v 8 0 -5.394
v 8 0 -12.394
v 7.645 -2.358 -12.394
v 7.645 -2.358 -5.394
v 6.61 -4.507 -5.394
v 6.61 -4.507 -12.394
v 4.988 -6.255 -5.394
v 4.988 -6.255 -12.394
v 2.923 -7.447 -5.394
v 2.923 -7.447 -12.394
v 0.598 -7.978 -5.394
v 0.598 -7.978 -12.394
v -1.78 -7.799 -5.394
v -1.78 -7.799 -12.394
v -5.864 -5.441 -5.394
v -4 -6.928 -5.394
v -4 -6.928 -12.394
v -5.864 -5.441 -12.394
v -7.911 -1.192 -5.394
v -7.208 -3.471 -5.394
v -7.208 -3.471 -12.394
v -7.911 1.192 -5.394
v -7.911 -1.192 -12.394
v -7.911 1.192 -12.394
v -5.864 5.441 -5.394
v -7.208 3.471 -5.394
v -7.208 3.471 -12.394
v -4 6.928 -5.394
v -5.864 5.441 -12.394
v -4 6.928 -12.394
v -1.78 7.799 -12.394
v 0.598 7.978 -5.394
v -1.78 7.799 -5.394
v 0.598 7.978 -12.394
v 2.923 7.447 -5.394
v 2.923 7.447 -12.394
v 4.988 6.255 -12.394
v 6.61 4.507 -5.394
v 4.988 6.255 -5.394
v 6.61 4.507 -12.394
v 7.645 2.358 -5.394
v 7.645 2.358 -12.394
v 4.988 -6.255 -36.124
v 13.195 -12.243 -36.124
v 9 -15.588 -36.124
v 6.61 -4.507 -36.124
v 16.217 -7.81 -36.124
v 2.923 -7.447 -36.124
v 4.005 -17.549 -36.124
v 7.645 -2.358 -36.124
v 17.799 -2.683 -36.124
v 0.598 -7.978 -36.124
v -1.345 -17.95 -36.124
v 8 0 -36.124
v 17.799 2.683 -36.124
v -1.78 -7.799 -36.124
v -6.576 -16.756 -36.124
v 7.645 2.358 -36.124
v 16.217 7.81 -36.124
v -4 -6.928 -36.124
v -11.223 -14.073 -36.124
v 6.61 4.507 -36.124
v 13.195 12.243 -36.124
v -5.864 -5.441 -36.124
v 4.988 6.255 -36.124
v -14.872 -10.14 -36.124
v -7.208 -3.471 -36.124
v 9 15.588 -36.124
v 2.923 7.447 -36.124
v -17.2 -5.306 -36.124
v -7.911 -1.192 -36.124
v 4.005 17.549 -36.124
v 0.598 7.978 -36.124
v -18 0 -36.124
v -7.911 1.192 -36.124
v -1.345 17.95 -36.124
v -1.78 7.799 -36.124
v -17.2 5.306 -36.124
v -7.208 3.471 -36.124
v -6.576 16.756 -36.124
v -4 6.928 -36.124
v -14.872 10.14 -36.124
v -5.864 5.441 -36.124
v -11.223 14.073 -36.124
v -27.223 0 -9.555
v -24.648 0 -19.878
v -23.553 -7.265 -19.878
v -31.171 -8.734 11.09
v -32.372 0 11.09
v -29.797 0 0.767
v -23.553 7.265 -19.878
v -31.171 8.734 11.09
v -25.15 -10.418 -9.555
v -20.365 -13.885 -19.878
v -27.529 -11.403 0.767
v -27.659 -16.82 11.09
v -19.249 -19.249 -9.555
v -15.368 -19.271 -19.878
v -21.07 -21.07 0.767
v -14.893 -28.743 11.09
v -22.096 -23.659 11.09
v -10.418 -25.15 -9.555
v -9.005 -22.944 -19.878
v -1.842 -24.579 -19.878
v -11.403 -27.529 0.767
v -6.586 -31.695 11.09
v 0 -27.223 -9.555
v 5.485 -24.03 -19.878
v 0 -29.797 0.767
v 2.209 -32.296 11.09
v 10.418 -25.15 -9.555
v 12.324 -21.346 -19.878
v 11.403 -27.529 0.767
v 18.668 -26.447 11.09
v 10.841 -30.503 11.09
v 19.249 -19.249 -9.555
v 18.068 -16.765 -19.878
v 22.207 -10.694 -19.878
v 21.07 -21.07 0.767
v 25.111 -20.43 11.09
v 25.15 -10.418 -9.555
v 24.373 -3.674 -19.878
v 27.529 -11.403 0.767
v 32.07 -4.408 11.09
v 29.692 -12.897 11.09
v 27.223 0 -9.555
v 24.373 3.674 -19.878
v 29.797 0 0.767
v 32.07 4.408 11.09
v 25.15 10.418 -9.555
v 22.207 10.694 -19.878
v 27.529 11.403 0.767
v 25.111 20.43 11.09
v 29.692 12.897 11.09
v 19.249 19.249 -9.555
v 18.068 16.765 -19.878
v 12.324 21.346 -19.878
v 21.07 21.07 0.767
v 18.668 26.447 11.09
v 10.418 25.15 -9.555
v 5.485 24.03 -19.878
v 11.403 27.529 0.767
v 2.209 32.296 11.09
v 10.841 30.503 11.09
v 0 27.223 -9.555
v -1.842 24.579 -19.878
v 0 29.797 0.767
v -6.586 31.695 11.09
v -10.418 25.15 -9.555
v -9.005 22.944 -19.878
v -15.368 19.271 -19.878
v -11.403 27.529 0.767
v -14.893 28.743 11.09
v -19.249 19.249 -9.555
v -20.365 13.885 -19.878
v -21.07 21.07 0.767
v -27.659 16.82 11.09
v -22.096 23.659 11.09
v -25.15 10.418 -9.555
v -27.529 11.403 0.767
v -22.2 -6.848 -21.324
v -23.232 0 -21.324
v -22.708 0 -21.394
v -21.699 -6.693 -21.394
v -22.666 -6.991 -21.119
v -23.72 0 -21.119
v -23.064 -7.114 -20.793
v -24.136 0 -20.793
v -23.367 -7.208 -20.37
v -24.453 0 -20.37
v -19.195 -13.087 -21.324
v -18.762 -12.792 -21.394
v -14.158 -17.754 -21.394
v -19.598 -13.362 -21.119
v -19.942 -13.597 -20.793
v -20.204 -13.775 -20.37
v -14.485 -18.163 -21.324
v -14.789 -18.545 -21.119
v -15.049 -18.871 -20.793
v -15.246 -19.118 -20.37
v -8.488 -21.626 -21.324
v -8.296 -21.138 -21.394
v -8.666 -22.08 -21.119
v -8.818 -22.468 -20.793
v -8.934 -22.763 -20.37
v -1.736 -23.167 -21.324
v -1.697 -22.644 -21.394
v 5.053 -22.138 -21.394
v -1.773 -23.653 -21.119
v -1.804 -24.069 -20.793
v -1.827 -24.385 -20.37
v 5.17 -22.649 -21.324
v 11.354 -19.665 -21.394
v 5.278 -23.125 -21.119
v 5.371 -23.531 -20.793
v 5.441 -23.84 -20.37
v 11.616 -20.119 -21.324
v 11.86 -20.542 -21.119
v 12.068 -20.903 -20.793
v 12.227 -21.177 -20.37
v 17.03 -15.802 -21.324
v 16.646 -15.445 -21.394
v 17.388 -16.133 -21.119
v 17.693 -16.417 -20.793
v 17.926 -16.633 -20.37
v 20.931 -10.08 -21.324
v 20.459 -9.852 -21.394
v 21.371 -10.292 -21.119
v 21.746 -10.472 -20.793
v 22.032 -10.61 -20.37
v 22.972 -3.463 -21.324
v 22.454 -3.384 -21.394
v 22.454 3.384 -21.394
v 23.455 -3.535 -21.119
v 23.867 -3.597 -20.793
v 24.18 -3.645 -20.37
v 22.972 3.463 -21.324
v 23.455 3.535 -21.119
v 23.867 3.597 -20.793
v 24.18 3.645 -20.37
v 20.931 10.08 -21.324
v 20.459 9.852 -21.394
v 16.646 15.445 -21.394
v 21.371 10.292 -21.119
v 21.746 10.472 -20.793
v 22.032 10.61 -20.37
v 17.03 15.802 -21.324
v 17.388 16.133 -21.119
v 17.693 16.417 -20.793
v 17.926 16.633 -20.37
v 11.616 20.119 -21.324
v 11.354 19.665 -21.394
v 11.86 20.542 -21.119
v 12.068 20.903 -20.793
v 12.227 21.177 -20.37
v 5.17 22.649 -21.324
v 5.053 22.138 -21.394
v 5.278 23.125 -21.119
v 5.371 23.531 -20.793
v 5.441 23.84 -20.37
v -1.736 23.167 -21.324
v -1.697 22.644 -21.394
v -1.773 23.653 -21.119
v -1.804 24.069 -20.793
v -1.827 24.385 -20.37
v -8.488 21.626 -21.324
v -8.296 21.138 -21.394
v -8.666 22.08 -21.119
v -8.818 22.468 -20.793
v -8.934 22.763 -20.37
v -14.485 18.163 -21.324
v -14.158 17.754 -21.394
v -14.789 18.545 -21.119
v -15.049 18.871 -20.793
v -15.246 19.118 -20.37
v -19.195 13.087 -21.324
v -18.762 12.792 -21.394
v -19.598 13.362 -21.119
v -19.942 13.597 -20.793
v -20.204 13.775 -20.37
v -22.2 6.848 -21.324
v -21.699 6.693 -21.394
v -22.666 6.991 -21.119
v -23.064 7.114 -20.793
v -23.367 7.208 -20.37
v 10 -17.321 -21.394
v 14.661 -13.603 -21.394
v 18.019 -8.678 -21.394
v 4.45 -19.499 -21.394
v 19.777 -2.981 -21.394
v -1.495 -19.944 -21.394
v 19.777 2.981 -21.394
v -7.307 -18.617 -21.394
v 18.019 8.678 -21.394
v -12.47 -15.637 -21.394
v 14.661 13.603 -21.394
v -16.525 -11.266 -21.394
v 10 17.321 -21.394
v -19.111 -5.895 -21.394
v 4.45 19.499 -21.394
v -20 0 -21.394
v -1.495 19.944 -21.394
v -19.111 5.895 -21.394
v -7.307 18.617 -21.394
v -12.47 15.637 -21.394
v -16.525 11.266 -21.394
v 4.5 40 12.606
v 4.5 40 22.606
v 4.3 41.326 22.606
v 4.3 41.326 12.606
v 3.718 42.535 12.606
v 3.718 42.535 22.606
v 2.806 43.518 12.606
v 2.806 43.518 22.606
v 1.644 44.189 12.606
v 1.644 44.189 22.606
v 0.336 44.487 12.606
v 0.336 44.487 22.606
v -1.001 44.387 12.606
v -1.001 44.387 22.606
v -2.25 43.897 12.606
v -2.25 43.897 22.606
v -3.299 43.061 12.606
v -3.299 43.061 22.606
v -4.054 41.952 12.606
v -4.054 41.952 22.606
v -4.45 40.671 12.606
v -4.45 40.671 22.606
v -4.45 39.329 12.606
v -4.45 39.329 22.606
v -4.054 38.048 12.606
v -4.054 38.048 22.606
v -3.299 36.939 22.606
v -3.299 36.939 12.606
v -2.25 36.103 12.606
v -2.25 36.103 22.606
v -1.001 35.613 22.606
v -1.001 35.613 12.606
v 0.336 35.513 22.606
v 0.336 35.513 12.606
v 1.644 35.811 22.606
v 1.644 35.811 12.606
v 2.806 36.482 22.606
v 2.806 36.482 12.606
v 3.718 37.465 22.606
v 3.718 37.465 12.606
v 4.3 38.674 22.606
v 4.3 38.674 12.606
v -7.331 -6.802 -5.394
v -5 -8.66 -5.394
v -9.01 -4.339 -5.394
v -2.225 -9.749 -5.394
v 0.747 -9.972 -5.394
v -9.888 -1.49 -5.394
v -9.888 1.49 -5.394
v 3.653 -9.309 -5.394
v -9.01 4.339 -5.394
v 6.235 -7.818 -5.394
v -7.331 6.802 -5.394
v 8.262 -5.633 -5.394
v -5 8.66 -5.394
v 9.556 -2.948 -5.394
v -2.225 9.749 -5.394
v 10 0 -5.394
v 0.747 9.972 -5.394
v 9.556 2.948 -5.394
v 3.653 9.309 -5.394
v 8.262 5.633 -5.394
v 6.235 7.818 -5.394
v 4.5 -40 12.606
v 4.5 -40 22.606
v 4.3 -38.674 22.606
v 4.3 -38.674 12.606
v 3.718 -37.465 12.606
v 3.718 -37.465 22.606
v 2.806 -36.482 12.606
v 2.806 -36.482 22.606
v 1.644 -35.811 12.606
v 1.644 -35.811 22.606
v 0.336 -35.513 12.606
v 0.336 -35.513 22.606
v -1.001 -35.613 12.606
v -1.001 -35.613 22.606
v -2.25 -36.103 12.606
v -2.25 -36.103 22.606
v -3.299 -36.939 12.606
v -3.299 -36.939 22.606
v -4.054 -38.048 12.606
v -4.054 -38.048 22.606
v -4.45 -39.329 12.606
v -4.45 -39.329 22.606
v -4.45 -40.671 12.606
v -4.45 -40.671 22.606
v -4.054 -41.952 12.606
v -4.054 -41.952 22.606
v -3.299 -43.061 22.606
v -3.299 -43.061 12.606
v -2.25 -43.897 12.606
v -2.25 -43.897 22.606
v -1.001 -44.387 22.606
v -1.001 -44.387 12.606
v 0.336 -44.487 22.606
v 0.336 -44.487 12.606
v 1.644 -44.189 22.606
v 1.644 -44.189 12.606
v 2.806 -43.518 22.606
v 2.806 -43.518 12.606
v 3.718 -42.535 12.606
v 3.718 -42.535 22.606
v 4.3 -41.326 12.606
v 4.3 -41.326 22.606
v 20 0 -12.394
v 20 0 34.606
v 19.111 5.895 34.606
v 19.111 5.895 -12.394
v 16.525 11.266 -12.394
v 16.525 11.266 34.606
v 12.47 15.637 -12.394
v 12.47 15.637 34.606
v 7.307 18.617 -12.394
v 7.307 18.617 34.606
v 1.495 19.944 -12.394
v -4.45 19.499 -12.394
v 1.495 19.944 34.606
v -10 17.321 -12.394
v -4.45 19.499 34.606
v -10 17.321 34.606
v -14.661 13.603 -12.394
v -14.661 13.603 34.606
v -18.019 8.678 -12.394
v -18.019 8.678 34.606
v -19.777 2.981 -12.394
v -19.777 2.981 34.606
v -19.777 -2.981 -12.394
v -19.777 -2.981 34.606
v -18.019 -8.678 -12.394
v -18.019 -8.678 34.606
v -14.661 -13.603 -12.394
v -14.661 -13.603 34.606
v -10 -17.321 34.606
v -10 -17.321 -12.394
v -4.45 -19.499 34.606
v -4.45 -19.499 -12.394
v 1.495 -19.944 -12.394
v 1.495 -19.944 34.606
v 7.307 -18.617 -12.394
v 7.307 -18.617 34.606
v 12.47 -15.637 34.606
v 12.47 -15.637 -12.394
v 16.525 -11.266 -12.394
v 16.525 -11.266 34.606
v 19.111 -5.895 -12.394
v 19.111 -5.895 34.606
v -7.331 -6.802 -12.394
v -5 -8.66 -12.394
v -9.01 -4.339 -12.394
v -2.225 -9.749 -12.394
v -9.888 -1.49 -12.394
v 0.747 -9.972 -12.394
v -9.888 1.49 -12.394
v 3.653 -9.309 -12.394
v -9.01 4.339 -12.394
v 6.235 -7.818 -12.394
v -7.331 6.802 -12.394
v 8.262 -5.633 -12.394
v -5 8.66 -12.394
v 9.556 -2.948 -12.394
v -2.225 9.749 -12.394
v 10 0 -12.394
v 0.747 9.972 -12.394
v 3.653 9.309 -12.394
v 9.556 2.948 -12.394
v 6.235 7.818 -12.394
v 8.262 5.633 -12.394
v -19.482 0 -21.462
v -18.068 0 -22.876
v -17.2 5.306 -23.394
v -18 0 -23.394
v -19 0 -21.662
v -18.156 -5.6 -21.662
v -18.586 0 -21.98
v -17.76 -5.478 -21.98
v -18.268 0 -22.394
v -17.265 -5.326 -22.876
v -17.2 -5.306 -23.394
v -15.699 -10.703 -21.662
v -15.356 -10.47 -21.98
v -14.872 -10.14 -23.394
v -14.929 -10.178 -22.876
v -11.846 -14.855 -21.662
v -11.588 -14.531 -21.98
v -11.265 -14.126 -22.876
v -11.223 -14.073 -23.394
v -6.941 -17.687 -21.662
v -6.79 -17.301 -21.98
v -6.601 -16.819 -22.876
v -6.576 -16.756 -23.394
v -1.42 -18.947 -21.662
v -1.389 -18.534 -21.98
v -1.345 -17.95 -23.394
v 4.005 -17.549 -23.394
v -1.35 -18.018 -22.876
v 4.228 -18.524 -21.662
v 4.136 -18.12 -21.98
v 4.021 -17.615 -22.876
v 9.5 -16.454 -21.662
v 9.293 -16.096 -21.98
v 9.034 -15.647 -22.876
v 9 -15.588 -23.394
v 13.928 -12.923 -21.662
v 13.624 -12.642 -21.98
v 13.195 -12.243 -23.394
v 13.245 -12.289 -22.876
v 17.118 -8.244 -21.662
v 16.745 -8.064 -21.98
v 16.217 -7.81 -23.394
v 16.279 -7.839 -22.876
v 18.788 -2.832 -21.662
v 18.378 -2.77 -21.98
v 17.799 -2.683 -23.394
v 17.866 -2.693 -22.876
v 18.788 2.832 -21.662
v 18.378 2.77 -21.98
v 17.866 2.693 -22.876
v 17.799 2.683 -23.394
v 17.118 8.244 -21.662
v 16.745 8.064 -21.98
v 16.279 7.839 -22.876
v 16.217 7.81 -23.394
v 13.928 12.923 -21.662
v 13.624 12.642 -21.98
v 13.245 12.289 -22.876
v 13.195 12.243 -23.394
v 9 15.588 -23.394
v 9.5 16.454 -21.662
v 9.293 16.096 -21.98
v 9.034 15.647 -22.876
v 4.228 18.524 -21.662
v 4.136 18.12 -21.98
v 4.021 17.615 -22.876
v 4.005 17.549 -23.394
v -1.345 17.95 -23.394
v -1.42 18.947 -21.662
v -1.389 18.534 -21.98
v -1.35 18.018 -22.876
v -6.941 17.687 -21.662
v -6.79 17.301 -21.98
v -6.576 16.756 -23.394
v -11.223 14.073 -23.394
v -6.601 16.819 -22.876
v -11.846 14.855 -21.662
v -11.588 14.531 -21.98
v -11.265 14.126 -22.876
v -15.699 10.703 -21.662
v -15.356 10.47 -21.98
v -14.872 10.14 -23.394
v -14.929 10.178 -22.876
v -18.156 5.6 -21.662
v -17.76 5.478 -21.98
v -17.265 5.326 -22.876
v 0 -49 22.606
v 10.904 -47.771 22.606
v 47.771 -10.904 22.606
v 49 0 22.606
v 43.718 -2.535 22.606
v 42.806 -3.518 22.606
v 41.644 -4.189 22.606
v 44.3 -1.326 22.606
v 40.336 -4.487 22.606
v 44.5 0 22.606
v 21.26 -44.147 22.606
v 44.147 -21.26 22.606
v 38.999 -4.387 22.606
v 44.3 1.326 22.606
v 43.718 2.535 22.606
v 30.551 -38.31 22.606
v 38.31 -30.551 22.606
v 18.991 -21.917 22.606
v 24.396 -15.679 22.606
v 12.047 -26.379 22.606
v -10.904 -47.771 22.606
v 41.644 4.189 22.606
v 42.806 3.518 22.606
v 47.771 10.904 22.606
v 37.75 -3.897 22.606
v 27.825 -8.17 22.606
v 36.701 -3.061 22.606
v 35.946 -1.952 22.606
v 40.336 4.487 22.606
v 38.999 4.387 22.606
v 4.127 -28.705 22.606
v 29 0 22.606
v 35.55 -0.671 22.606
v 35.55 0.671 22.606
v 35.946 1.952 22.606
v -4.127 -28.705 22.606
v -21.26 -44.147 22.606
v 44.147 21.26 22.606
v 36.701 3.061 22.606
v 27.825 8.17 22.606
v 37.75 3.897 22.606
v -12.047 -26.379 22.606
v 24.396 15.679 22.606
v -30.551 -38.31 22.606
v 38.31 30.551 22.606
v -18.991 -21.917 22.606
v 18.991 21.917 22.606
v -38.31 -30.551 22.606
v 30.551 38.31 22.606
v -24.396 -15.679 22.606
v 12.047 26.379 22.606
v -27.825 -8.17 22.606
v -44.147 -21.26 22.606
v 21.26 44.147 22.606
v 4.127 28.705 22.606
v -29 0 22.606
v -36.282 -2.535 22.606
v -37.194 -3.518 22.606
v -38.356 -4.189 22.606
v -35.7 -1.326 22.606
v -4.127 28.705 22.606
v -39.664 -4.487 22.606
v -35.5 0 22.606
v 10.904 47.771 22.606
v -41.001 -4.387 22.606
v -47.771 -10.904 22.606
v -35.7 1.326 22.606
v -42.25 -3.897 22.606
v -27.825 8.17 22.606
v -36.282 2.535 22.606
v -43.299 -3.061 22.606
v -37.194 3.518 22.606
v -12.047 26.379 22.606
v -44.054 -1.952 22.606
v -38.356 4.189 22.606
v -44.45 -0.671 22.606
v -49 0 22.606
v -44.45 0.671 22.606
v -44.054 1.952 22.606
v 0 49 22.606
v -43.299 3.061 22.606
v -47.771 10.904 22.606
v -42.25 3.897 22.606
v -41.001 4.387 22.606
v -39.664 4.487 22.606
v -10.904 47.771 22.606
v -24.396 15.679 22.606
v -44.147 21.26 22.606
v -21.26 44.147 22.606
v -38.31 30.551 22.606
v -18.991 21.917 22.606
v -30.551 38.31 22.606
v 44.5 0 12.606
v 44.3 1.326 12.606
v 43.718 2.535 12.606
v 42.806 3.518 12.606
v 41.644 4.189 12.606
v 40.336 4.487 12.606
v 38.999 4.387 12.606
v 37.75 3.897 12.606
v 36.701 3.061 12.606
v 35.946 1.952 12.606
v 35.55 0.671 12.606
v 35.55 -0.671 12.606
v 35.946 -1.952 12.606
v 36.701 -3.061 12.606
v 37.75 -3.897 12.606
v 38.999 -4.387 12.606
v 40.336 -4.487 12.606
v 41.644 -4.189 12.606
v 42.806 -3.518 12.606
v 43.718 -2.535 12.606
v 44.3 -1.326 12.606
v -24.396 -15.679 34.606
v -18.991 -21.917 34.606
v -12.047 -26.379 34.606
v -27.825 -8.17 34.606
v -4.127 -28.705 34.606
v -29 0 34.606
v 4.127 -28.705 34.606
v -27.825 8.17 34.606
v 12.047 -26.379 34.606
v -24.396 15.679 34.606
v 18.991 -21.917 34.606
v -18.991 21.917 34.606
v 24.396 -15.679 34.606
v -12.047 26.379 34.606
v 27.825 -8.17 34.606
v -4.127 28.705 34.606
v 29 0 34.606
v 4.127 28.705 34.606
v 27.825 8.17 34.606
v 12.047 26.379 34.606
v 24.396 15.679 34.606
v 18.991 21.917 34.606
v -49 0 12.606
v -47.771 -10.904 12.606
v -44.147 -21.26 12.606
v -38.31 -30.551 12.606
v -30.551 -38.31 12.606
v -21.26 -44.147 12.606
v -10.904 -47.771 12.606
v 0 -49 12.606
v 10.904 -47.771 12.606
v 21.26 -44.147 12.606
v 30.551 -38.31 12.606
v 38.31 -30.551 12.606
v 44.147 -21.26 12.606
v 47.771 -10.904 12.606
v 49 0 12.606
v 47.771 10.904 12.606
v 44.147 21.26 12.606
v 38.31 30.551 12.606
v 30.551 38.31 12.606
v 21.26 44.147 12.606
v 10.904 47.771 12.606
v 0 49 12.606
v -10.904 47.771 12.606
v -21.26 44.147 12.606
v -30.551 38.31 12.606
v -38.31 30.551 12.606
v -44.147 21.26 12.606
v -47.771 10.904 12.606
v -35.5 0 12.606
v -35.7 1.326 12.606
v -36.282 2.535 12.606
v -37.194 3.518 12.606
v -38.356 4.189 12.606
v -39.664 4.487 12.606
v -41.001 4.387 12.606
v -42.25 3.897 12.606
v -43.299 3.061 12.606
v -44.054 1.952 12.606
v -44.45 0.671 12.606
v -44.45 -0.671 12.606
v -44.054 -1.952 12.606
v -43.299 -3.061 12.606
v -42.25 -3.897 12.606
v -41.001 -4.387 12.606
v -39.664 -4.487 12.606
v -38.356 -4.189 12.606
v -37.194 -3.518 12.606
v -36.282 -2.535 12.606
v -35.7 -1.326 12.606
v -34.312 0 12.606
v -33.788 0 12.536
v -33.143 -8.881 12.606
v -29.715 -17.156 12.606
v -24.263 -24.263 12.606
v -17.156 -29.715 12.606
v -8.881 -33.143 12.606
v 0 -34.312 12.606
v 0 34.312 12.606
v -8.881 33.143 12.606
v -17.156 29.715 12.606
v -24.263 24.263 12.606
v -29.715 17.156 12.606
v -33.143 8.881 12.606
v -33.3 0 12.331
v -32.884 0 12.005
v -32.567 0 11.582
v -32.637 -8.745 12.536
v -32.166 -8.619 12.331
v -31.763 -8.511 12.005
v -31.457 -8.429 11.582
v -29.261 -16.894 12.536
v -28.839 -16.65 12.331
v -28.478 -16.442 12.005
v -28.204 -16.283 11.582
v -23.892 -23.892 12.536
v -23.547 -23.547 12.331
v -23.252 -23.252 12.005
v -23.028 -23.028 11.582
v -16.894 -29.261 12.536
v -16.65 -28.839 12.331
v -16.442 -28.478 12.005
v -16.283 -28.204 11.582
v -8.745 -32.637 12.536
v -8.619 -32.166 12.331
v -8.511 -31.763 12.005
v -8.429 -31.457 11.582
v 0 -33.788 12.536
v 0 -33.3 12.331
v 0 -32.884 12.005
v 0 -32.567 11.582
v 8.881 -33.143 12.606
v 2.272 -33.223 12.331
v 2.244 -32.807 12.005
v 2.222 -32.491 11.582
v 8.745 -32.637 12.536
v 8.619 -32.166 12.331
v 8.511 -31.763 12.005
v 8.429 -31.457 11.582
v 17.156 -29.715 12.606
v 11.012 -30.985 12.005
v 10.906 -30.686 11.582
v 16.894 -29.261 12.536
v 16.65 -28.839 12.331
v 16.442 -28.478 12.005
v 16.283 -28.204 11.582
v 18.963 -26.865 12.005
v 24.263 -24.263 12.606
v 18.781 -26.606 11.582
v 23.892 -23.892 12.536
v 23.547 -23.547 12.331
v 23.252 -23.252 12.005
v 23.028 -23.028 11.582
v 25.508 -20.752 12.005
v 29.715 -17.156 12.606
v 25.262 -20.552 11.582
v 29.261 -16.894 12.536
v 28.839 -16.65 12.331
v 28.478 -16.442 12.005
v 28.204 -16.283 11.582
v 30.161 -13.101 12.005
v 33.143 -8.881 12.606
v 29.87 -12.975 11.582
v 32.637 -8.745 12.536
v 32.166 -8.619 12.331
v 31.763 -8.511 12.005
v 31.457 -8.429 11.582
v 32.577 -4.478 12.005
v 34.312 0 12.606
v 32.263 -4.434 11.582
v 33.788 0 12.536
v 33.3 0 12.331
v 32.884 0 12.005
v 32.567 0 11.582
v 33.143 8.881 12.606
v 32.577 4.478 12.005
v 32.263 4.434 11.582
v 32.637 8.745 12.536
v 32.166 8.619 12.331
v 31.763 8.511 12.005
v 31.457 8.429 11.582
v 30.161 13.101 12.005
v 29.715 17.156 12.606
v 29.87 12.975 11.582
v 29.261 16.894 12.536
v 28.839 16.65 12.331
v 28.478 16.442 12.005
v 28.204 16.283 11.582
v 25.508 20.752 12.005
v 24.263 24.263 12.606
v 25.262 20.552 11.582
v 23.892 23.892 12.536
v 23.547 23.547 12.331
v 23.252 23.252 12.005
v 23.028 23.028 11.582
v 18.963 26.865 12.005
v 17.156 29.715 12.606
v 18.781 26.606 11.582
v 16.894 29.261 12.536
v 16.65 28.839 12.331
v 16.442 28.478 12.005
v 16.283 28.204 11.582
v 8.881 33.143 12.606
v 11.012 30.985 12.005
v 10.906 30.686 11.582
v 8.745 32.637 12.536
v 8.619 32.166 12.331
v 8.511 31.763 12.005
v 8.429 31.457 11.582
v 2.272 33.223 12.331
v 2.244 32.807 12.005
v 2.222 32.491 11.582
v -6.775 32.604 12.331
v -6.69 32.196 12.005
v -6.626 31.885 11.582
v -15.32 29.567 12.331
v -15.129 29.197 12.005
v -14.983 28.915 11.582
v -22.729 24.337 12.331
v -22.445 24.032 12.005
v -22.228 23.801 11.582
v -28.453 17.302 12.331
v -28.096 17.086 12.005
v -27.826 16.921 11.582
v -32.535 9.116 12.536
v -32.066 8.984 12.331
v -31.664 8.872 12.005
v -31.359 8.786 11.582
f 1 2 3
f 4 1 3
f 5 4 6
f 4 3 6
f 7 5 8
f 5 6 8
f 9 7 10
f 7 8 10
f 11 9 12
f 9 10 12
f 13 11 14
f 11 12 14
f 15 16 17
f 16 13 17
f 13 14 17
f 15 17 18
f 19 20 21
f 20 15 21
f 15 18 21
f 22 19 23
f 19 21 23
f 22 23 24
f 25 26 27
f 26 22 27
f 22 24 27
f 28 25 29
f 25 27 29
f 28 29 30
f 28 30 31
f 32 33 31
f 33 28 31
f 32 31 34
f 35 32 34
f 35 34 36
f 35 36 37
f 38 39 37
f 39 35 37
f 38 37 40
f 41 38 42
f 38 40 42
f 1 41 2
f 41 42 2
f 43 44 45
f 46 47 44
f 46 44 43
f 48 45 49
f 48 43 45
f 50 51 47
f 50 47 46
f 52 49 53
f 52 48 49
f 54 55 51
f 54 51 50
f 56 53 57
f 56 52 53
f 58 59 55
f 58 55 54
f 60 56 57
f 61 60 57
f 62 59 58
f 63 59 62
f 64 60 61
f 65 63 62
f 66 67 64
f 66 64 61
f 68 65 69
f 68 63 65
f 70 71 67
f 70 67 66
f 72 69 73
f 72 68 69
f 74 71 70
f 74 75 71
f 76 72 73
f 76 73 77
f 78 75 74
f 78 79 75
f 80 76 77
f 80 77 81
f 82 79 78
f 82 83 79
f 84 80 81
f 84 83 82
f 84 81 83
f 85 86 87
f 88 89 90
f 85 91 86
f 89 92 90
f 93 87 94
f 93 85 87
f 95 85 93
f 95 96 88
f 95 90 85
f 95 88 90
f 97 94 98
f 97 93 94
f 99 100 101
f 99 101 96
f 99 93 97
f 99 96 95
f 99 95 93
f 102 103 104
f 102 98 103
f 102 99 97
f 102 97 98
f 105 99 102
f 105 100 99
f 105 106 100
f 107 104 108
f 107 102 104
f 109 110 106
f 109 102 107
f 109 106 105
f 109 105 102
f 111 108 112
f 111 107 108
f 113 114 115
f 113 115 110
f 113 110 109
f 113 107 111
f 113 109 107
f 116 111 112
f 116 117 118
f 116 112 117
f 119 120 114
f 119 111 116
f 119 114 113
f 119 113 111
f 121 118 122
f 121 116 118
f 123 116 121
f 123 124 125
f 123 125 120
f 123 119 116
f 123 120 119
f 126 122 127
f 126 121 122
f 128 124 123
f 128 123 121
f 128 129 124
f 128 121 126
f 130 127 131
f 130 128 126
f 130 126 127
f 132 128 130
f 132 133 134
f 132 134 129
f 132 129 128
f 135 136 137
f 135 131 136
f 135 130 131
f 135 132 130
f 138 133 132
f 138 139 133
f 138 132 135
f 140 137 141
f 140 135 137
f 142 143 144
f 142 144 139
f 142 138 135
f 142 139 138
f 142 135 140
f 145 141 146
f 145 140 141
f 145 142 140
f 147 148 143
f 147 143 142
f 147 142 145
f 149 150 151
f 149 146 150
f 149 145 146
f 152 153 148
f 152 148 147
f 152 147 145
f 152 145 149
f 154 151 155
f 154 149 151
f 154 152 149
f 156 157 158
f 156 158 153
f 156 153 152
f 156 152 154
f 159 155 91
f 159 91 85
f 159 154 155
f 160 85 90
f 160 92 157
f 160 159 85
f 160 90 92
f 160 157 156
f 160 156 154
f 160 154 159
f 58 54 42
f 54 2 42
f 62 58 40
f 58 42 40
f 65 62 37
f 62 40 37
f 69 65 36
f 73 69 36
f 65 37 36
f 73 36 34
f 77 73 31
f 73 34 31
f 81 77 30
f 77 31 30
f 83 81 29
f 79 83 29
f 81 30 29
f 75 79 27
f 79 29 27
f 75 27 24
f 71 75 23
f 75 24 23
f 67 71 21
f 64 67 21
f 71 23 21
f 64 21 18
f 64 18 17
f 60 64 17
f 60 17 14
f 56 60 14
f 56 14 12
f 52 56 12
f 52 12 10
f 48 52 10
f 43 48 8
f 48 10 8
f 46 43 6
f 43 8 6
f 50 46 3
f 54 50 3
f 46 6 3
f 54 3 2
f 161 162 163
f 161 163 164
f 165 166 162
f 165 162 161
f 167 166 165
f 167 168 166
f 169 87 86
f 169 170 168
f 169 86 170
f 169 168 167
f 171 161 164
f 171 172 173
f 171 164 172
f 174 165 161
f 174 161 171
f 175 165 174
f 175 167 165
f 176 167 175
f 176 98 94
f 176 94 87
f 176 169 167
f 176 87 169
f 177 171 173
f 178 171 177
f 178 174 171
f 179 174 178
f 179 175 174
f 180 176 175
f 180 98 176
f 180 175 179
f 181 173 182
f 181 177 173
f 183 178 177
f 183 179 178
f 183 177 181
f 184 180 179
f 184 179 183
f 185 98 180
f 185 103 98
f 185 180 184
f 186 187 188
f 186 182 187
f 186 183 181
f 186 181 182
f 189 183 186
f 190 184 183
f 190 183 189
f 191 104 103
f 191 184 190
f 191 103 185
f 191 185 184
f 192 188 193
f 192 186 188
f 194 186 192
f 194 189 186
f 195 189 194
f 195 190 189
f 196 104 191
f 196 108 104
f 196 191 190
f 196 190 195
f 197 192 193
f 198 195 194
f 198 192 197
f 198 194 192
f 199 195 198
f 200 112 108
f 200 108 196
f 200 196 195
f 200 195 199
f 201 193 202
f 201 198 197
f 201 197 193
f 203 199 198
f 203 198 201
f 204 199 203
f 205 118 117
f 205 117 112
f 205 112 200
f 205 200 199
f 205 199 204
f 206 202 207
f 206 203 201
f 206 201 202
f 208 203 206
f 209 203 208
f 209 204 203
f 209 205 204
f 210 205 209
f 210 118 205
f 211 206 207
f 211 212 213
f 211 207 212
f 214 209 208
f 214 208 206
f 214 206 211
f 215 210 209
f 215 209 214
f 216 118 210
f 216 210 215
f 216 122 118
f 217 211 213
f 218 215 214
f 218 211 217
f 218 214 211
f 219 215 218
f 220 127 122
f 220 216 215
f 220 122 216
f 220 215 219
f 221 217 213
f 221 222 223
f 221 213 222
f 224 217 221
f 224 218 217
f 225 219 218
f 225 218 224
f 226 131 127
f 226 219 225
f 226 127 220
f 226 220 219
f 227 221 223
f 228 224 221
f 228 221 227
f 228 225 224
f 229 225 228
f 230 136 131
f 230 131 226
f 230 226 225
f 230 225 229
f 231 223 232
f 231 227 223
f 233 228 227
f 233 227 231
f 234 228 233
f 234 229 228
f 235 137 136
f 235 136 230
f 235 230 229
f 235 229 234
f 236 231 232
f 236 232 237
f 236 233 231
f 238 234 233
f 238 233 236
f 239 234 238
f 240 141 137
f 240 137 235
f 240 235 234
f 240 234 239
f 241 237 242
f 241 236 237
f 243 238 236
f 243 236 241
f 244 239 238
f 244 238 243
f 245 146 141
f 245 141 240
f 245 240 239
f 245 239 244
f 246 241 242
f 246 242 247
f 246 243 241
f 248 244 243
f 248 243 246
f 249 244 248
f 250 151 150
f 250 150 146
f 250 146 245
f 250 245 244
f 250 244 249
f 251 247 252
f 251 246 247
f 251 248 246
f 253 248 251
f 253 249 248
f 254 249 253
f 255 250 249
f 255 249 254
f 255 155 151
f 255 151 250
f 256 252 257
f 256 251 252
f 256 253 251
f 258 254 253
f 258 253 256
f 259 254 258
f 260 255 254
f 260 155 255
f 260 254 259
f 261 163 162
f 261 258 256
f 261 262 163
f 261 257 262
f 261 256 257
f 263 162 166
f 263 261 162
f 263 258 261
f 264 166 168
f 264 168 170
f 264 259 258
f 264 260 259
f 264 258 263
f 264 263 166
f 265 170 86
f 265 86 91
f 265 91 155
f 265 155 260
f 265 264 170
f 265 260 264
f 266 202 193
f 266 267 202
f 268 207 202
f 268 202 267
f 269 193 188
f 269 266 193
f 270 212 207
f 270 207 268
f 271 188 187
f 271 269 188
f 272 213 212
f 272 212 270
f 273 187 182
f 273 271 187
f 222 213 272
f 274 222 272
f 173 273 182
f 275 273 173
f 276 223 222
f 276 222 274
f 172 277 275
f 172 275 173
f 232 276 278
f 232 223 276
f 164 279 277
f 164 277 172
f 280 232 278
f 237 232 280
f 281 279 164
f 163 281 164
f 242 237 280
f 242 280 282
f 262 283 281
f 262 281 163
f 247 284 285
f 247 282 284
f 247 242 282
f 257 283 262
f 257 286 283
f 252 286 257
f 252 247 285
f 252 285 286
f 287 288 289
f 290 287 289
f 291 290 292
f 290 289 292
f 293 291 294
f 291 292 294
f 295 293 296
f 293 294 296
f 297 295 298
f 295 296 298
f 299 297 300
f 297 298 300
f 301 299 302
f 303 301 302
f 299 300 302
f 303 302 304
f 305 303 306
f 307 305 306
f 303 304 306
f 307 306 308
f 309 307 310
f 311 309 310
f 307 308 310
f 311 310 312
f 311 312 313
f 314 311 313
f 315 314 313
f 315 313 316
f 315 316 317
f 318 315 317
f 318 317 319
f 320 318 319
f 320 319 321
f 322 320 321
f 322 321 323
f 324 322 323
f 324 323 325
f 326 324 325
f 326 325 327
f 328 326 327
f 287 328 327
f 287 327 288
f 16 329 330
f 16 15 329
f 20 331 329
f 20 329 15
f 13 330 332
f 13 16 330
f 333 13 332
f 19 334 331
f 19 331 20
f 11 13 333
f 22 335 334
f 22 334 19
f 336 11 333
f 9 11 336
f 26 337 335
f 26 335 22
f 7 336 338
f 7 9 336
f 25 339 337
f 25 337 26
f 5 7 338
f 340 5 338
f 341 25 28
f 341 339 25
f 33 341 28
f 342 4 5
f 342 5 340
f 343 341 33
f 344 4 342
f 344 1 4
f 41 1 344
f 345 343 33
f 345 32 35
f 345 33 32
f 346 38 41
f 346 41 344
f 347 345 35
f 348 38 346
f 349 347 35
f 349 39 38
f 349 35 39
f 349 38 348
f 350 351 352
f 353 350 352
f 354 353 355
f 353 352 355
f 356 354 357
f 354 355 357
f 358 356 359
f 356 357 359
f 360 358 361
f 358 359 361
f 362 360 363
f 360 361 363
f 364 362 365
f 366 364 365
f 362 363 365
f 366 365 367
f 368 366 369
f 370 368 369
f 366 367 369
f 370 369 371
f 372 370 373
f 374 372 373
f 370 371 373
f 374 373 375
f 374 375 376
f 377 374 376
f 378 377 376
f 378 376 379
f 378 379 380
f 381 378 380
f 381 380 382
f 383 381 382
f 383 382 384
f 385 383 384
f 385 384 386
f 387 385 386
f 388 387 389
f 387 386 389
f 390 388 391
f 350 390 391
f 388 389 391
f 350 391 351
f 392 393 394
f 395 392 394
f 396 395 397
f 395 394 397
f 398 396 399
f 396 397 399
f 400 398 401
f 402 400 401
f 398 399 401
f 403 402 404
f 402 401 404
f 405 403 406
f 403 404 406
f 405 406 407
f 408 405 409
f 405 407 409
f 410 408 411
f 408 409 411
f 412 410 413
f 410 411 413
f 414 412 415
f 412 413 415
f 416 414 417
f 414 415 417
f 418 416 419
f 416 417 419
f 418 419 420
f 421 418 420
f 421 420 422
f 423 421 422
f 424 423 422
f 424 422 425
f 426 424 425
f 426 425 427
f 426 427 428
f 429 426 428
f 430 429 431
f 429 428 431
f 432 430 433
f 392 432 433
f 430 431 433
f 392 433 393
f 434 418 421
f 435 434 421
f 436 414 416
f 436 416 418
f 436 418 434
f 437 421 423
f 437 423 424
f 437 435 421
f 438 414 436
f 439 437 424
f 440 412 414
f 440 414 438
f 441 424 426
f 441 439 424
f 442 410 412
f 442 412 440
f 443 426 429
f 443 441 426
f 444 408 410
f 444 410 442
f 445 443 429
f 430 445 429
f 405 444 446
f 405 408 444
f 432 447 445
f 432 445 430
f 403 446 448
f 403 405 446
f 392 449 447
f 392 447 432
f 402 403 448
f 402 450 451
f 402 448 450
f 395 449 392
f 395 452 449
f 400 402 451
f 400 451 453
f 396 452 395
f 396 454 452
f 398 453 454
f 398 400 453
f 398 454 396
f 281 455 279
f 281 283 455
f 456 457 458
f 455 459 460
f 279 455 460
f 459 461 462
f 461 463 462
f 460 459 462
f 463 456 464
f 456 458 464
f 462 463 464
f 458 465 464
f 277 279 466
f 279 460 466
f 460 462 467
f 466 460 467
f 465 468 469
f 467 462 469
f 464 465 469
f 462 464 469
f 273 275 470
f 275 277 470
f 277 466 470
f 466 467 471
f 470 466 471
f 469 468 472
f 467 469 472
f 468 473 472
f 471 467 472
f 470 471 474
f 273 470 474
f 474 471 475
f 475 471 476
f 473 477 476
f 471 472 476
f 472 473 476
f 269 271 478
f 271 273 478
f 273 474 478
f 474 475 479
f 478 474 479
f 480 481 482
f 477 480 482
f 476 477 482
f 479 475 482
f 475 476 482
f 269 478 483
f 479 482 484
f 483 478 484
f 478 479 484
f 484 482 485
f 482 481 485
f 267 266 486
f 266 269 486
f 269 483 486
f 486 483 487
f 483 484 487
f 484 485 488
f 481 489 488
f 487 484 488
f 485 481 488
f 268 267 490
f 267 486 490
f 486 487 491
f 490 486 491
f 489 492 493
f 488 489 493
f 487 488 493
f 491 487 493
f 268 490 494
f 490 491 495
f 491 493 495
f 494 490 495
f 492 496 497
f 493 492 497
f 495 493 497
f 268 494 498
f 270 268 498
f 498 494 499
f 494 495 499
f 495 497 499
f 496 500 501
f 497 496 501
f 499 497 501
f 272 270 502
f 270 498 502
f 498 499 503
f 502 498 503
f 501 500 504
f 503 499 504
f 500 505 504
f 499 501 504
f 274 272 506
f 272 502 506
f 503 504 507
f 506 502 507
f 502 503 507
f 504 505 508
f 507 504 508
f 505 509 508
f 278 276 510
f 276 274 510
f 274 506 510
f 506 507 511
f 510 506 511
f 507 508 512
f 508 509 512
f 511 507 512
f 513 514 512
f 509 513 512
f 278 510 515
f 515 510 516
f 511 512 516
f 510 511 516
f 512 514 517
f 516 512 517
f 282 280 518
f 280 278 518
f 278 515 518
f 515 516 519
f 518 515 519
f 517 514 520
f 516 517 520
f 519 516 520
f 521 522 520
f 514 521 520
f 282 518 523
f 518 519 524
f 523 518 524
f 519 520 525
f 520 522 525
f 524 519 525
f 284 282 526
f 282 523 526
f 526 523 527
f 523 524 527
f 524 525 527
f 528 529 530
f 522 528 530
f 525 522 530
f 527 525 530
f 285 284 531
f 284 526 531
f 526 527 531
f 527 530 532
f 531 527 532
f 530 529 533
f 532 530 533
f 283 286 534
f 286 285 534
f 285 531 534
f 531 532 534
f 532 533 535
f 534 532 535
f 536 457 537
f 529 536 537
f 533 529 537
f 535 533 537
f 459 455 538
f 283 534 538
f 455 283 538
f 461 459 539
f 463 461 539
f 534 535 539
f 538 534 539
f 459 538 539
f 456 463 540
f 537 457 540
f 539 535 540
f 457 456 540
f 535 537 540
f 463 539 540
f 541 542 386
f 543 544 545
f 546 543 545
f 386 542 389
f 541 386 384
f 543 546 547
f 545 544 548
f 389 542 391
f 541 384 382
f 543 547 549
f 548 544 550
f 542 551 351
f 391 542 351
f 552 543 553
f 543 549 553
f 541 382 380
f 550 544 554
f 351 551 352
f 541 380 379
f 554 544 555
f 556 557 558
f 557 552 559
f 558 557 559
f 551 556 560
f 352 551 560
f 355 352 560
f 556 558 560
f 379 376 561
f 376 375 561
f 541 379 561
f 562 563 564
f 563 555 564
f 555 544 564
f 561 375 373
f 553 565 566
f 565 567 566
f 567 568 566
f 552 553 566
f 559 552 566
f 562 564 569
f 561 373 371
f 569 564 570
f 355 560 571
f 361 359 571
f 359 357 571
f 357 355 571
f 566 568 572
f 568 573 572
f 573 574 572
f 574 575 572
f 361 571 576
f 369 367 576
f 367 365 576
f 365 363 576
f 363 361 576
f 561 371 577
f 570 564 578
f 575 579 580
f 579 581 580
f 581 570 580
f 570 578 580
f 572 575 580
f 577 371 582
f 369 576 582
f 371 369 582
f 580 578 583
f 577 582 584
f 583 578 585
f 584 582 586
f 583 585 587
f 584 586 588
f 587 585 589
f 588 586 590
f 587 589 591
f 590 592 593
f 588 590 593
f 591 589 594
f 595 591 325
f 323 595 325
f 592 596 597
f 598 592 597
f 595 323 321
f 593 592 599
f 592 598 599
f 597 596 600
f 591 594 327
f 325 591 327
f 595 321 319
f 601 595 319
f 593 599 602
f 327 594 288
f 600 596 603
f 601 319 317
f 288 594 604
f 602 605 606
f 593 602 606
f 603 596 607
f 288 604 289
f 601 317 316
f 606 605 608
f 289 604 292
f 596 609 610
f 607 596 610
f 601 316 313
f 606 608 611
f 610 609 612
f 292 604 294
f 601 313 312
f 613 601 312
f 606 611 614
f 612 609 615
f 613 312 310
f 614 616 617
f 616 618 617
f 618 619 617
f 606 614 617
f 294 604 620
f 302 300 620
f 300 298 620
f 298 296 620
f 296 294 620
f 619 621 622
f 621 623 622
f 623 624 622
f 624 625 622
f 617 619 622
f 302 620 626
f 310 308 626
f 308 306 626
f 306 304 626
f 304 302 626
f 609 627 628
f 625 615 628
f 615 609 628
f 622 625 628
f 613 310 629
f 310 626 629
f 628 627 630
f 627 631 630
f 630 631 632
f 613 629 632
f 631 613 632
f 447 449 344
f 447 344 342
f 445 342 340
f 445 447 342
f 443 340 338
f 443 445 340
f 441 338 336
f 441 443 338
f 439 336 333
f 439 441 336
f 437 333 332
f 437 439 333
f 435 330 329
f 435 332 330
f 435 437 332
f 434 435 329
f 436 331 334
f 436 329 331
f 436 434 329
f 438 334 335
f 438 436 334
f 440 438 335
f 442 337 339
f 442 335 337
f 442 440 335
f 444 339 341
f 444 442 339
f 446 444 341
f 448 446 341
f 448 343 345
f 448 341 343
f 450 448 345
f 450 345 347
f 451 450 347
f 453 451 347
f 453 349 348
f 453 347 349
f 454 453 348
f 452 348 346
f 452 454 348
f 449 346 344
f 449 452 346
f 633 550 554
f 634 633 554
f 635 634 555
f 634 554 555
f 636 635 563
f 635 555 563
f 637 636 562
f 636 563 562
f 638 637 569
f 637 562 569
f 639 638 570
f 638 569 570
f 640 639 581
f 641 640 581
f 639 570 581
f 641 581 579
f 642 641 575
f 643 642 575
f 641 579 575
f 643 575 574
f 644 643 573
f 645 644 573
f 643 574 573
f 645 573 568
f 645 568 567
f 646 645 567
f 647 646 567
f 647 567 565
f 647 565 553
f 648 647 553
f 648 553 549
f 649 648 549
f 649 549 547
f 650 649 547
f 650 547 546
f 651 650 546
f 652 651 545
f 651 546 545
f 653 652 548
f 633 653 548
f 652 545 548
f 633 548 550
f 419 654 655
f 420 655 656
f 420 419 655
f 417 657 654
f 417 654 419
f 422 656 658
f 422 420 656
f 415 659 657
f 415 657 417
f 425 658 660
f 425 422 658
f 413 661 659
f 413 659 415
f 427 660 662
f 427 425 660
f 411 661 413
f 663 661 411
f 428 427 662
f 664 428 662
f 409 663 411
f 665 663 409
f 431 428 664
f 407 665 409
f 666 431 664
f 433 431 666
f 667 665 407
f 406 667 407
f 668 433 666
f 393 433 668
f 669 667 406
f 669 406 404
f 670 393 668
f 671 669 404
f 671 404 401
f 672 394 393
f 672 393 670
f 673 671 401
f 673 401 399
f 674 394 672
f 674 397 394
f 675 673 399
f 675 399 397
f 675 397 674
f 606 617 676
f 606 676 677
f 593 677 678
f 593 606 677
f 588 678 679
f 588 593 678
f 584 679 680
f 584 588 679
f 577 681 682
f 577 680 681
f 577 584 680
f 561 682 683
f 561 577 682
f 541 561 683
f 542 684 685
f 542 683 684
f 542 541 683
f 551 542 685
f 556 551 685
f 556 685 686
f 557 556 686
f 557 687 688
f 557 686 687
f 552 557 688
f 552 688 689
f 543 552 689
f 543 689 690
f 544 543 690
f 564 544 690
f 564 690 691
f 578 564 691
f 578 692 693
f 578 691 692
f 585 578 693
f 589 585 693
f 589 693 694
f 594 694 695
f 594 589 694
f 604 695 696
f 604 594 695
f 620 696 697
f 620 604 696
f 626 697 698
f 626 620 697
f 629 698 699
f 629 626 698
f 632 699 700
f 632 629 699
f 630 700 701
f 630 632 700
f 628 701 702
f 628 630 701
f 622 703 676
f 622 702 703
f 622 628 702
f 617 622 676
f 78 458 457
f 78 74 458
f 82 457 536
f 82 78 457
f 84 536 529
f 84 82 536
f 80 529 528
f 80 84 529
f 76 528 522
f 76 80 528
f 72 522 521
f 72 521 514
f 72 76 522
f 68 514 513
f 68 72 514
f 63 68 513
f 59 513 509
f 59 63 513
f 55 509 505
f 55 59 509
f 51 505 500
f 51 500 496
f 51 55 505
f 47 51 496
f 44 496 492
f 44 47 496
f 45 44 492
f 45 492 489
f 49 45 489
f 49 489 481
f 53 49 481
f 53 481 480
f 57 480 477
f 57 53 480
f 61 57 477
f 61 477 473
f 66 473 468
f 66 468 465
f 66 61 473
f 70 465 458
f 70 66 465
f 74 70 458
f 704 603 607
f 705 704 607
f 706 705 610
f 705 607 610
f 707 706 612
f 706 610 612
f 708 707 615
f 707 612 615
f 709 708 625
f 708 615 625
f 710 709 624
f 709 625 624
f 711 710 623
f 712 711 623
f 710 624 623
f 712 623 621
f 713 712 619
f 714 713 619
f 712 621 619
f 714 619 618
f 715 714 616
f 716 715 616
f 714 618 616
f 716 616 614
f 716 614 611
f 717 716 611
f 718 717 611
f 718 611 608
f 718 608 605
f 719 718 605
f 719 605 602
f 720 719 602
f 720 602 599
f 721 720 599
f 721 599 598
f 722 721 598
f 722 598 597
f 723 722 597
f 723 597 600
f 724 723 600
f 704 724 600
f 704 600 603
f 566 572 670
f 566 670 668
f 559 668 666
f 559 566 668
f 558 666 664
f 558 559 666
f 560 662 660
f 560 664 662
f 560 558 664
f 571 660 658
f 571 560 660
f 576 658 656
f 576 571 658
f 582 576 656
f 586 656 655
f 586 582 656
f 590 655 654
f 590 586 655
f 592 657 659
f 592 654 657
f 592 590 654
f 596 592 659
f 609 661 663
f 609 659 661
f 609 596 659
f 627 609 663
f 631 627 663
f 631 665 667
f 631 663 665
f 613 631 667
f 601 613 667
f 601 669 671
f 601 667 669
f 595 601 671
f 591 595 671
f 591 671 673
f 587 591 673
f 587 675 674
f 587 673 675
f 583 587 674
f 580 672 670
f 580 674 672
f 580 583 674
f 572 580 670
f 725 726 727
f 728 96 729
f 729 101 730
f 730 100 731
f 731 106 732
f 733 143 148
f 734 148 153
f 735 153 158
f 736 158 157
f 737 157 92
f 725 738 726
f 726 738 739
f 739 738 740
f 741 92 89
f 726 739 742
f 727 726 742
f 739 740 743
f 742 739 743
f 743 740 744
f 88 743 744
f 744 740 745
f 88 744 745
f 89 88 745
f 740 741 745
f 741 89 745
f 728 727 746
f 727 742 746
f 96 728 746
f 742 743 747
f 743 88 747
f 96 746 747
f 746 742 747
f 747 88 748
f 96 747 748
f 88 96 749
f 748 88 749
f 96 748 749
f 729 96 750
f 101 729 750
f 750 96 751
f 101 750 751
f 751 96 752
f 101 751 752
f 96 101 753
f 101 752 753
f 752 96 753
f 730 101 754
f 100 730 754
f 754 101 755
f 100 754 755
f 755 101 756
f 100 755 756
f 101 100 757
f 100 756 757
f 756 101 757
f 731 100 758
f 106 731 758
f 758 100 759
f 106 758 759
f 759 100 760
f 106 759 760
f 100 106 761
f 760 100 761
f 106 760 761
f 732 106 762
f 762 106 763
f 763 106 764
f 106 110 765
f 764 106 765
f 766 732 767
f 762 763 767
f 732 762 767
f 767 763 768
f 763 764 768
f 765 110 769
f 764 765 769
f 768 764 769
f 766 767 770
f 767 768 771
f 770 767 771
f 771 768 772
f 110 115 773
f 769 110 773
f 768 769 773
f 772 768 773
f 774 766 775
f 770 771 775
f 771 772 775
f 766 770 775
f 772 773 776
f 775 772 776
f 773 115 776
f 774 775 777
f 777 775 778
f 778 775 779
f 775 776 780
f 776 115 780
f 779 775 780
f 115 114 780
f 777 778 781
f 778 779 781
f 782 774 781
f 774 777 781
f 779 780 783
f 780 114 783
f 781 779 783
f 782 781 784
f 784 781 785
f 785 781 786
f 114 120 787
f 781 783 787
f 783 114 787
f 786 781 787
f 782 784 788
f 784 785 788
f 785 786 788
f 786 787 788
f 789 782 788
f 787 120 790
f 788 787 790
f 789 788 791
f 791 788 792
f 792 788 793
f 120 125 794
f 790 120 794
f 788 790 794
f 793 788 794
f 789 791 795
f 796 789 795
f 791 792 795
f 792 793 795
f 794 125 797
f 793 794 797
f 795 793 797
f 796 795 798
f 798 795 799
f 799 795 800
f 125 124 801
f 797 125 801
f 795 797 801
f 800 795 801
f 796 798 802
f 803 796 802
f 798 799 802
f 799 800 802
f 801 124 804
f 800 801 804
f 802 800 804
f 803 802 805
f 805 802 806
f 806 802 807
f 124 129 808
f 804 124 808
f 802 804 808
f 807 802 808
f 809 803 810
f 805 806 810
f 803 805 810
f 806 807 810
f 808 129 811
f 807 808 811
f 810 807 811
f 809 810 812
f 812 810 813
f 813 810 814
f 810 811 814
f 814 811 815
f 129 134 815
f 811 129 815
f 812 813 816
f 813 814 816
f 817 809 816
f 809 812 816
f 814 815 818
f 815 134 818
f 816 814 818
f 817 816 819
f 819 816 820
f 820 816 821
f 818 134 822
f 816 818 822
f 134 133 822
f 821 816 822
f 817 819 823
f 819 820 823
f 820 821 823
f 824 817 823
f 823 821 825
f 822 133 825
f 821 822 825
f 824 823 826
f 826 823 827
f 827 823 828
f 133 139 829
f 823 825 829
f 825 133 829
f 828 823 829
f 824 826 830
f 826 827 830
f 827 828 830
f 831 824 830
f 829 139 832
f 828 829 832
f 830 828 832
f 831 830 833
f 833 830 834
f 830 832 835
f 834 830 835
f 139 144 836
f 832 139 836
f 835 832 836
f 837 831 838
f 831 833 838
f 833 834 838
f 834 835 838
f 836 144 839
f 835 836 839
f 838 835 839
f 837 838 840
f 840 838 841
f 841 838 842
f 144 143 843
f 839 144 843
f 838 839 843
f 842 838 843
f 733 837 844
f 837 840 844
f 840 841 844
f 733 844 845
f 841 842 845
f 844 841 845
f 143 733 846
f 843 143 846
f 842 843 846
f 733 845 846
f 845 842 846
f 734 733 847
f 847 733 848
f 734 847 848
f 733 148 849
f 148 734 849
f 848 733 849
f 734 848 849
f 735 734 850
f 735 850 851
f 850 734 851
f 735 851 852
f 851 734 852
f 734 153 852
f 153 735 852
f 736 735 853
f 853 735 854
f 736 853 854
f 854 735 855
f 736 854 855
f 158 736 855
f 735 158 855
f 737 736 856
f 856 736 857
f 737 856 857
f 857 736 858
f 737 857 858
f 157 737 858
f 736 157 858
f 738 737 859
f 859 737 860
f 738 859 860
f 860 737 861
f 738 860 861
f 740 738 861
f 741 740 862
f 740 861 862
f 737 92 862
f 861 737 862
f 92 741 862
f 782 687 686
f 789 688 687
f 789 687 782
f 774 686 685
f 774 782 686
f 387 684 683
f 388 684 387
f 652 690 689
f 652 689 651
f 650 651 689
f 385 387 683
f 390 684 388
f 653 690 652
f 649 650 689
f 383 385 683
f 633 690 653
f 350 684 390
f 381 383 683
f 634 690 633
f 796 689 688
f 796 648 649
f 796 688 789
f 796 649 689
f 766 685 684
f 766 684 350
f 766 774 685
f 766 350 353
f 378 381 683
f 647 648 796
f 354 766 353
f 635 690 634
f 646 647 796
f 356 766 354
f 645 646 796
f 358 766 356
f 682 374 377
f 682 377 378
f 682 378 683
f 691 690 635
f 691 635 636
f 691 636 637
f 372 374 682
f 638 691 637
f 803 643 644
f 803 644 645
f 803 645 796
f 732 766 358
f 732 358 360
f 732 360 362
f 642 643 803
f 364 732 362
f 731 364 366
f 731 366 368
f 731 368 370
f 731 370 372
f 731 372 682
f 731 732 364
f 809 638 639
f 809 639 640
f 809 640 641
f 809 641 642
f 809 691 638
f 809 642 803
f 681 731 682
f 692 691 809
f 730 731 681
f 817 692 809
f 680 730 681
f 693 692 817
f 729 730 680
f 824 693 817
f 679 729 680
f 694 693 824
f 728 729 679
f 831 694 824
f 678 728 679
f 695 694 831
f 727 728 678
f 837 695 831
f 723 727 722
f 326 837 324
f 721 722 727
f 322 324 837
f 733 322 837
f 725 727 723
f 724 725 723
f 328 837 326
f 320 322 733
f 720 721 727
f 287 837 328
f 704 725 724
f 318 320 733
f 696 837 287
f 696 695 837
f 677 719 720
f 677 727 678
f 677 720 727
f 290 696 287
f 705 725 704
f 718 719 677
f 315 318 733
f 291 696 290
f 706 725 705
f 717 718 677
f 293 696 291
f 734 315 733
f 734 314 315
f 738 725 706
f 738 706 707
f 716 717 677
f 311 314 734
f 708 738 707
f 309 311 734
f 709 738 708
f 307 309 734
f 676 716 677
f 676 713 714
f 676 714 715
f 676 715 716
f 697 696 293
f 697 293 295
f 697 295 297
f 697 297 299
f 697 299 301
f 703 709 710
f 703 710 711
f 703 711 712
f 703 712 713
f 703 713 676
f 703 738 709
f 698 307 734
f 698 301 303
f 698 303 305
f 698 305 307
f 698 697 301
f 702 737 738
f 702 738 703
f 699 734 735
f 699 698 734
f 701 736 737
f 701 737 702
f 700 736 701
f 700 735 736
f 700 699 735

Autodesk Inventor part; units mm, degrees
ref_plane "YZ Plane" through (0, 0, 0) normal (1, 0, 0) x (0, 1, 0)
ref_plane "XZ Plane" through (0, 0, 0) normal (0, 1, 0) x (-1, 0, 0)
ref_plane "XY Plane" through (0, 0, 0) normal (0, 0, 1) x (1, 0, 0)
sketch "Szkic1" plane through (0, 0, 0) normal (0, 1, 0) x (-1, 0, 0)
  line L0 (34.3124, 12.606) -> (49, 12.606)
  line L1 (0, 12.606) -> (0, -21.394)
  line L2 (20, -21.394) -> (22.7076, -21.394)
  line L3 (49, 12.606) -> (32.75, 12.606)
  line L4 (32.3719, 11.09) -> (24.6481, -19.878)
  arc A0 (34.3124, 12.606) -> (32.3719, 11.09) centre (34.3124, 10.606) ccw
  arc A1 (22.7076, -21.394) -> (24.6481, -19.878) centre (22.7076, -19.394) ccw
  line L5 (49, 12.606) -> (49, 22.606)
  line L6 (49, 22.606) -> (0, 22.606)
  line L7 (0, 22.606) -> (0, 12.606)
  line L8 (0, -21.394) -> (18, -21.394)
  line L9 (18, -23.394) -> (18, -36.124)
  line L10 (18, -36.124) -> (0, -36.124)
  line L11 (0, -36.124) -> (0, -21.394)
  arc A2 (20, -21.394) -> (18, -23.394) centre (20, -23.394) ccw
  point P0 (0, 0)
  point P1 (24.27, -21.394)
  dimension "d0" = 49
  dimension "d1" = 34
  dimension "d2" = 24.27
  dimension "d3" = 16.25
  dimension "d4" = 2
  dimension "d5" = 2
  dimension "d6" = 10
  dimension "d7" = 18
  dimension "d8" = 14.73
  dimension "d9" = 2
revolve "Obrót1" add sketch "Szkic1" angle 360 about axis through (0, 0, 12.606) along (0, 0, -1)
sketch "Szkic4" plane through (0, 0, 22.606) normal (0, 0, 1) x (1, 0, 0)
  circle A0 centre (0, 0) radius 8
  dimension "d16" = 16
sketch "Szkic5" plane through (0, 0, 22.606) normal (0, 0, 1) x (1, 0, 0)
  circle A0 centre (0, 0) radius 40
  circle A1 centre (-40, 0) radius 4.5
  circle A2 centre (0, -40) radius 4.5
  circle A3 centre (40, 0) radius 4.5
  circle A4 centre (0, 40) radius 4.5
  point P0 (-39.7469, -4.4929)
  point P1 (-39.7469, 4.4929)
  dimension "d21" = 80
  dimension "d22" = 9
  dimension "d31" = 9
  dimension "d32" = 9
  dimension "d33" = 9
extrude "Wyciągnięcie proste3" cut sketch "Szkic5" against normal through all contours A0 A3 | A0 A3 | A4 A0 | A0 A4 | A2 A0 | A0 A2 | A1 A0 | A0 A1
extrude "Wyciągnięcie proste5" cut sketch "Szkic4" against normal blind 60
sketch "Szkic7" plane through (0, 0, 22.606) normal (0, 0, 1) x (1, 0, 0)
  circle A0 centre (0, 0) radius 29
extrude "Wyciągnięcie proste6" add sketch "Szkic7" along normal blind 12
sketch "Szkic8" plane through (0, 0, 34.606) normal (0, 0, 1) x (1, 0, 0)
  circle A0 centre (0, 0) radius 8 projected
  circle A1 centre (0, 0) radius 20
extrude "Wyciągnięcie proste7" cut sketch "Szkic8" against normal blind 47 contours A0 | A1
sketch "Szkic9" plane through (0, 0, -12.394) normal (0, 0, 1) x (1, 0, 0)
  circle A0 centre (0, 0) radius 10
  circle A1 centre (0, 0) radius 8
extrude "Wyciągnięcie proste8" add sketch "Szkic9" along normal blind 7
properties part number "pokrywa" material "Srebro"
